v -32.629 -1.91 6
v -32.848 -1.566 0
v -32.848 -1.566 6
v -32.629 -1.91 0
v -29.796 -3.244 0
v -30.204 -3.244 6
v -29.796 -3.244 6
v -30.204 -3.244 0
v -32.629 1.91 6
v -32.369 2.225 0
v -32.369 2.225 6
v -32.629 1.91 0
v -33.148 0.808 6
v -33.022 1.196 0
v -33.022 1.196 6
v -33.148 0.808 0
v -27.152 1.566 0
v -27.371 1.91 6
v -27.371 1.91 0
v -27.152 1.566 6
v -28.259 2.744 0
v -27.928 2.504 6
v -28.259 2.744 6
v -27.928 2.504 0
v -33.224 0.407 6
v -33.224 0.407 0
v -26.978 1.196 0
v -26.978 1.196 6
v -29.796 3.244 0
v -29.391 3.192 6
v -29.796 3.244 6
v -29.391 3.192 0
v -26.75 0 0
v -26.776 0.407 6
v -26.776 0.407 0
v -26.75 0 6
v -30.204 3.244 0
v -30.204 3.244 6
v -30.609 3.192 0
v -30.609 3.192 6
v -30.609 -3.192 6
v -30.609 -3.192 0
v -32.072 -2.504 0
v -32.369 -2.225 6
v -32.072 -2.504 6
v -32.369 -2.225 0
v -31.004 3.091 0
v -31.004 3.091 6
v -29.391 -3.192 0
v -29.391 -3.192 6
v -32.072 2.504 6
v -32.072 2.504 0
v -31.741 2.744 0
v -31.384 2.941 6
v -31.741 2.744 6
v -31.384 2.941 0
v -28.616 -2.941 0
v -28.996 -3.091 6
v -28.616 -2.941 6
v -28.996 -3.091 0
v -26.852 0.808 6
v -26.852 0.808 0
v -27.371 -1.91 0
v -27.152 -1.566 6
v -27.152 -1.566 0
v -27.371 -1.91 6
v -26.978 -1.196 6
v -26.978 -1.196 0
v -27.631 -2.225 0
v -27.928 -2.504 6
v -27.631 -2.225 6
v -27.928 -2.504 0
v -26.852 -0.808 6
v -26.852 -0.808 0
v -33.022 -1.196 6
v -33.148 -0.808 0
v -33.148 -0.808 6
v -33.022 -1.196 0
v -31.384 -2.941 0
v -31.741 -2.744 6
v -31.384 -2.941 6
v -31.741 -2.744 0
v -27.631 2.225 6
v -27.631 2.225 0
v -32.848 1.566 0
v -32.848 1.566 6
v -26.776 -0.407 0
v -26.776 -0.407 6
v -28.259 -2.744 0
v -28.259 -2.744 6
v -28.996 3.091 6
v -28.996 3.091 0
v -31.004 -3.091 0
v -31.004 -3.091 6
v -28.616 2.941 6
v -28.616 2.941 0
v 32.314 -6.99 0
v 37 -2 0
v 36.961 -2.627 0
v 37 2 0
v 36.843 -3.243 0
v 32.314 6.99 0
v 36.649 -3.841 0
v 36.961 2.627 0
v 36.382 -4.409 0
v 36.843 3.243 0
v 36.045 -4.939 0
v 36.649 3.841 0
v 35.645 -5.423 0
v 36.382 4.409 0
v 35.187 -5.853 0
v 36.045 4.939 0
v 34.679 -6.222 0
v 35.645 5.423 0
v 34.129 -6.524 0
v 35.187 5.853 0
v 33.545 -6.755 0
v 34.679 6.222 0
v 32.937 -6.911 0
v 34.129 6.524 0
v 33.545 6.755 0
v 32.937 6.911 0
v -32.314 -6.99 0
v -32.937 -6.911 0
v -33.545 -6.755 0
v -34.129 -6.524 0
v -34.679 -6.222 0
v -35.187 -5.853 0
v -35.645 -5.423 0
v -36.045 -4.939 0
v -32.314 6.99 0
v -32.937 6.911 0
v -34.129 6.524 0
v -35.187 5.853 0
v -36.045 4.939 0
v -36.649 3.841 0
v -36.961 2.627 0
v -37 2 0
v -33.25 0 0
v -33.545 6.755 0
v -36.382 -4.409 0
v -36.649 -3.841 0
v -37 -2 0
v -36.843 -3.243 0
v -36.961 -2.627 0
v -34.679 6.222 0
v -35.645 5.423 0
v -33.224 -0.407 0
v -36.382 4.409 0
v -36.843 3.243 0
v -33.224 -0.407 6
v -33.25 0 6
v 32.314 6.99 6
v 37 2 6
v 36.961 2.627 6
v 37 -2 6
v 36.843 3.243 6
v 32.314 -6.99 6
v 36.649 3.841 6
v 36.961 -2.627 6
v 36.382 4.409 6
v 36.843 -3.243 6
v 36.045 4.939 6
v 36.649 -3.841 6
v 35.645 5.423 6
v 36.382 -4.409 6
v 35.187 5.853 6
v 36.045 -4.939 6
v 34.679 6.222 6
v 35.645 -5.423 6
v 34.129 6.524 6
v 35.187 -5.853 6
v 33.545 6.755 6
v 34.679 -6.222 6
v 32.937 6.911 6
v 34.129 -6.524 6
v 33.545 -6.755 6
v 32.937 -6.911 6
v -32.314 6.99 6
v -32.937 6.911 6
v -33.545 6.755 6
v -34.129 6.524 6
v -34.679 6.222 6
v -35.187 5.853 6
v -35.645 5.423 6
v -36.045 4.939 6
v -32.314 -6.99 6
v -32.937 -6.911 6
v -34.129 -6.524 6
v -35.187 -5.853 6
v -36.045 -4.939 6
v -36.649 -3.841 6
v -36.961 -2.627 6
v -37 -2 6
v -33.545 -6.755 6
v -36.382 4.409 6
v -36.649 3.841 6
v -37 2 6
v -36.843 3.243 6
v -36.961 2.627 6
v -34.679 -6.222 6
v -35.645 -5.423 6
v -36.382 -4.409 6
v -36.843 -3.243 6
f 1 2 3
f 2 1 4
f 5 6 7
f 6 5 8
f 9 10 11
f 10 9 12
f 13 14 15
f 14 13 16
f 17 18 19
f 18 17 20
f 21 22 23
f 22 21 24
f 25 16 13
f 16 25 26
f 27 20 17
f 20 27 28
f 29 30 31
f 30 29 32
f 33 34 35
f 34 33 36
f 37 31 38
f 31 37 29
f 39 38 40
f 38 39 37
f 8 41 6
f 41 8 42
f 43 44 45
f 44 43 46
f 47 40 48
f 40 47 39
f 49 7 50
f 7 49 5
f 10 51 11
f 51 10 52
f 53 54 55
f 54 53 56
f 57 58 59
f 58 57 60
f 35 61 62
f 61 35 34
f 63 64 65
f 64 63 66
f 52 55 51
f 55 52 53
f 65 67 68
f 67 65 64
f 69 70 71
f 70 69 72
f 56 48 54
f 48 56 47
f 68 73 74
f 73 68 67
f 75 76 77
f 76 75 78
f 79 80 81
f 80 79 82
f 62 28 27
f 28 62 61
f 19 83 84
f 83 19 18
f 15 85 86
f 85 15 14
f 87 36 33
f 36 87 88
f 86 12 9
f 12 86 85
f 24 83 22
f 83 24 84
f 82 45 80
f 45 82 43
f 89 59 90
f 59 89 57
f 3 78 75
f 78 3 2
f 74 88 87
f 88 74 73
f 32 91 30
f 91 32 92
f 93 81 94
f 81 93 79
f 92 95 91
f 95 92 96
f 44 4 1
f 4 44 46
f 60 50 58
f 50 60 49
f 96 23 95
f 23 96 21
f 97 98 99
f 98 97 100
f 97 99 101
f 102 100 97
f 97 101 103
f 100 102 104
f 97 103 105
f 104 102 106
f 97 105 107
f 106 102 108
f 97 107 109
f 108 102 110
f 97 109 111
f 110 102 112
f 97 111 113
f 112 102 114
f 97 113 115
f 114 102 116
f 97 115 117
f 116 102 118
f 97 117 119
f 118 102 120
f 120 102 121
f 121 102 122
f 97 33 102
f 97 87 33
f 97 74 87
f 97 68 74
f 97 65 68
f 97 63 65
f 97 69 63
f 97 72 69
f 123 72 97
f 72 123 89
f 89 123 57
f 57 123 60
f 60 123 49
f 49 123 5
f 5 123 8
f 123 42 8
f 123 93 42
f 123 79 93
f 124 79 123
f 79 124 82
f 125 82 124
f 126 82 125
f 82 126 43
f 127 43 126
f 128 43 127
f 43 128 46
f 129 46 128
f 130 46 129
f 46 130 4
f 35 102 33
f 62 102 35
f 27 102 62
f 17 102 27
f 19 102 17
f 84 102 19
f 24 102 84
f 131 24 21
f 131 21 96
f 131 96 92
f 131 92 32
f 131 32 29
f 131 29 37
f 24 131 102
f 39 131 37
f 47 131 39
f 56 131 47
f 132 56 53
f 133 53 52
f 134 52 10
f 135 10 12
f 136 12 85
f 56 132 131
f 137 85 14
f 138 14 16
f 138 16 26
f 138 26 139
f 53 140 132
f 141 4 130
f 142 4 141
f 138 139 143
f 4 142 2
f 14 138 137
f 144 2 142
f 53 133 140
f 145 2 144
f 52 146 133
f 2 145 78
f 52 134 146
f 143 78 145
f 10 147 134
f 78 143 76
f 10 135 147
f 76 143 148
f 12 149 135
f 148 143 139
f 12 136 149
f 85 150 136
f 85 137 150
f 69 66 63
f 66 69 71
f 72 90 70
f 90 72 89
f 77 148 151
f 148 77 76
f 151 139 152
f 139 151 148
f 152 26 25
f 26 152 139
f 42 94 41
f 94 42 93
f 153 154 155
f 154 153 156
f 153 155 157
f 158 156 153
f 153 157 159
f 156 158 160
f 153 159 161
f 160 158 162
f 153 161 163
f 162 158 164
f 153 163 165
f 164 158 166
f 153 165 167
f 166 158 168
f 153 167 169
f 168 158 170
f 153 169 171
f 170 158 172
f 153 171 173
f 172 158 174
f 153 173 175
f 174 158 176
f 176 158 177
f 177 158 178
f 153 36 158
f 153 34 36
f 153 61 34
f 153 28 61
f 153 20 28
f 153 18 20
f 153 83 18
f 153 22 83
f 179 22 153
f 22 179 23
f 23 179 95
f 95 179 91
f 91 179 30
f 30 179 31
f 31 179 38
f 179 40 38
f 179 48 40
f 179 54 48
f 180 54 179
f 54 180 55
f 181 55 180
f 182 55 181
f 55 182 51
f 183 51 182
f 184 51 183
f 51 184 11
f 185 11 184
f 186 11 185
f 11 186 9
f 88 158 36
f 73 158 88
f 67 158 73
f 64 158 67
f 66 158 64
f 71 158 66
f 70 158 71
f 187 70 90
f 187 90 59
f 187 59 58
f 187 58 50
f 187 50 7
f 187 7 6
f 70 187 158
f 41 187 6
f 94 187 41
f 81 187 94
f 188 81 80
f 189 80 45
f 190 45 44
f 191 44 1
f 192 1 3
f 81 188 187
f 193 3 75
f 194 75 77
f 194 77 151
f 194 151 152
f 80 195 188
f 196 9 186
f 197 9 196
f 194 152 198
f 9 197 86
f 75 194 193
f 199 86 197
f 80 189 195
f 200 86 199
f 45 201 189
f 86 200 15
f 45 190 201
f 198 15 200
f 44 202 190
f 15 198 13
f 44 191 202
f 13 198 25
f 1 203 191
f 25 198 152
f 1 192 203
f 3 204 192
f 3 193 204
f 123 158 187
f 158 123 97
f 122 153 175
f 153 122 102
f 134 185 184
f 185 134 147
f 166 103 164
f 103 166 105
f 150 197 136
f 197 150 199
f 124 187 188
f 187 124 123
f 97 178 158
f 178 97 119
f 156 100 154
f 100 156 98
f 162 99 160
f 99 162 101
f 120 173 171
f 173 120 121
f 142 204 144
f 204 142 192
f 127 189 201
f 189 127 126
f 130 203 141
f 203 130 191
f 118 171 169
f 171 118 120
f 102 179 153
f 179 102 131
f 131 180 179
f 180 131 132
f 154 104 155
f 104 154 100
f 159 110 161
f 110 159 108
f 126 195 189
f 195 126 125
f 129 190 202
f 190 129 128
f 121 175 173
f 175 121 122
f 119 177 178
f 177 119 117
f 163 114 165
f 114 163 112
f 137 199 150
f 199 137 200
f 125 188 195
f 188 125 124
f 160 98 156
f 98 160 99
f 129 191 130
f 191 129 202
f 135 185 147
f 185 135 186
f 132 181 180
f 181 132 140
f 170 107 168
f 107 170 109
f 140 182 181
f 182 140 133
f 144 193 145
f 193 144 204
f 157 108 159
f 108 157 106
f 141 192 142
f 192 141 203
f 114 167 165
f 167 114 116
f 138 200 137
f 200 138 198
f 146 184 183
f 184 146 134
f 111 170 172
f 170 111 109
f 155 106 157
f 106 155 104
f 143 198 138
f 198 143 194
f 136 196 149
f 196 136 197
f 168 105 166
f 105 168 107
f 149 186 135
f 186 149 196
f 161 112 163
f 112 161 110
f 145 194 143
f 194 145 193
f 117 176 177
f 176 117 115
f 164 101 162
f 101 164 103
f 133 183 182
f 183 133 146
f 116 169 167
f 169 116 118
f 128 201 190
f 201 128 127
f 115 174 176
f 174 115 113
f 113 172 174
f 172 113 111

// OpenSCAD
$fn = 50;


difference() {
	union() {
		hull() {
			translate(v = [-32.0000000000, 2.0000000000, 0]) {
				cylinder(h = 6, r = 5);
			}
			translate(v = [32.0000000000, 2.0000000000, 0]) {
				cylinder(h = 6, r = 5);
			}
			translate(v = [-32.0000000000, -2.0000000000, 0]) {
				cylinder(h = 6, r = 5);
			}
			translate(v = [32.0000000000, -2.0000000000, 0]) {
				cylinder(h = 6, r = 5);
			}
		}
	}
	union() {
		translate(v = [-30.0000000000, 0.0000000000, 0]) {
			cylinder(h = 6, r = 3.2500000000);
		}
		translate(v = [-30.0000000000, 0.0000000000, 0]) {
			cylinder(h = 6, r = 1.8000000000);
		}
		translate(v = [-30.0000000000, 0.0000000000, 0]) {
			cylinder(h = 6, r = 1.8000000000);
		}
		translate(v = [-30.0000000000, 0.0000000000, 0]) {
			cylinder(h = 6, r = 1.8000000000);
		}
	}
}
